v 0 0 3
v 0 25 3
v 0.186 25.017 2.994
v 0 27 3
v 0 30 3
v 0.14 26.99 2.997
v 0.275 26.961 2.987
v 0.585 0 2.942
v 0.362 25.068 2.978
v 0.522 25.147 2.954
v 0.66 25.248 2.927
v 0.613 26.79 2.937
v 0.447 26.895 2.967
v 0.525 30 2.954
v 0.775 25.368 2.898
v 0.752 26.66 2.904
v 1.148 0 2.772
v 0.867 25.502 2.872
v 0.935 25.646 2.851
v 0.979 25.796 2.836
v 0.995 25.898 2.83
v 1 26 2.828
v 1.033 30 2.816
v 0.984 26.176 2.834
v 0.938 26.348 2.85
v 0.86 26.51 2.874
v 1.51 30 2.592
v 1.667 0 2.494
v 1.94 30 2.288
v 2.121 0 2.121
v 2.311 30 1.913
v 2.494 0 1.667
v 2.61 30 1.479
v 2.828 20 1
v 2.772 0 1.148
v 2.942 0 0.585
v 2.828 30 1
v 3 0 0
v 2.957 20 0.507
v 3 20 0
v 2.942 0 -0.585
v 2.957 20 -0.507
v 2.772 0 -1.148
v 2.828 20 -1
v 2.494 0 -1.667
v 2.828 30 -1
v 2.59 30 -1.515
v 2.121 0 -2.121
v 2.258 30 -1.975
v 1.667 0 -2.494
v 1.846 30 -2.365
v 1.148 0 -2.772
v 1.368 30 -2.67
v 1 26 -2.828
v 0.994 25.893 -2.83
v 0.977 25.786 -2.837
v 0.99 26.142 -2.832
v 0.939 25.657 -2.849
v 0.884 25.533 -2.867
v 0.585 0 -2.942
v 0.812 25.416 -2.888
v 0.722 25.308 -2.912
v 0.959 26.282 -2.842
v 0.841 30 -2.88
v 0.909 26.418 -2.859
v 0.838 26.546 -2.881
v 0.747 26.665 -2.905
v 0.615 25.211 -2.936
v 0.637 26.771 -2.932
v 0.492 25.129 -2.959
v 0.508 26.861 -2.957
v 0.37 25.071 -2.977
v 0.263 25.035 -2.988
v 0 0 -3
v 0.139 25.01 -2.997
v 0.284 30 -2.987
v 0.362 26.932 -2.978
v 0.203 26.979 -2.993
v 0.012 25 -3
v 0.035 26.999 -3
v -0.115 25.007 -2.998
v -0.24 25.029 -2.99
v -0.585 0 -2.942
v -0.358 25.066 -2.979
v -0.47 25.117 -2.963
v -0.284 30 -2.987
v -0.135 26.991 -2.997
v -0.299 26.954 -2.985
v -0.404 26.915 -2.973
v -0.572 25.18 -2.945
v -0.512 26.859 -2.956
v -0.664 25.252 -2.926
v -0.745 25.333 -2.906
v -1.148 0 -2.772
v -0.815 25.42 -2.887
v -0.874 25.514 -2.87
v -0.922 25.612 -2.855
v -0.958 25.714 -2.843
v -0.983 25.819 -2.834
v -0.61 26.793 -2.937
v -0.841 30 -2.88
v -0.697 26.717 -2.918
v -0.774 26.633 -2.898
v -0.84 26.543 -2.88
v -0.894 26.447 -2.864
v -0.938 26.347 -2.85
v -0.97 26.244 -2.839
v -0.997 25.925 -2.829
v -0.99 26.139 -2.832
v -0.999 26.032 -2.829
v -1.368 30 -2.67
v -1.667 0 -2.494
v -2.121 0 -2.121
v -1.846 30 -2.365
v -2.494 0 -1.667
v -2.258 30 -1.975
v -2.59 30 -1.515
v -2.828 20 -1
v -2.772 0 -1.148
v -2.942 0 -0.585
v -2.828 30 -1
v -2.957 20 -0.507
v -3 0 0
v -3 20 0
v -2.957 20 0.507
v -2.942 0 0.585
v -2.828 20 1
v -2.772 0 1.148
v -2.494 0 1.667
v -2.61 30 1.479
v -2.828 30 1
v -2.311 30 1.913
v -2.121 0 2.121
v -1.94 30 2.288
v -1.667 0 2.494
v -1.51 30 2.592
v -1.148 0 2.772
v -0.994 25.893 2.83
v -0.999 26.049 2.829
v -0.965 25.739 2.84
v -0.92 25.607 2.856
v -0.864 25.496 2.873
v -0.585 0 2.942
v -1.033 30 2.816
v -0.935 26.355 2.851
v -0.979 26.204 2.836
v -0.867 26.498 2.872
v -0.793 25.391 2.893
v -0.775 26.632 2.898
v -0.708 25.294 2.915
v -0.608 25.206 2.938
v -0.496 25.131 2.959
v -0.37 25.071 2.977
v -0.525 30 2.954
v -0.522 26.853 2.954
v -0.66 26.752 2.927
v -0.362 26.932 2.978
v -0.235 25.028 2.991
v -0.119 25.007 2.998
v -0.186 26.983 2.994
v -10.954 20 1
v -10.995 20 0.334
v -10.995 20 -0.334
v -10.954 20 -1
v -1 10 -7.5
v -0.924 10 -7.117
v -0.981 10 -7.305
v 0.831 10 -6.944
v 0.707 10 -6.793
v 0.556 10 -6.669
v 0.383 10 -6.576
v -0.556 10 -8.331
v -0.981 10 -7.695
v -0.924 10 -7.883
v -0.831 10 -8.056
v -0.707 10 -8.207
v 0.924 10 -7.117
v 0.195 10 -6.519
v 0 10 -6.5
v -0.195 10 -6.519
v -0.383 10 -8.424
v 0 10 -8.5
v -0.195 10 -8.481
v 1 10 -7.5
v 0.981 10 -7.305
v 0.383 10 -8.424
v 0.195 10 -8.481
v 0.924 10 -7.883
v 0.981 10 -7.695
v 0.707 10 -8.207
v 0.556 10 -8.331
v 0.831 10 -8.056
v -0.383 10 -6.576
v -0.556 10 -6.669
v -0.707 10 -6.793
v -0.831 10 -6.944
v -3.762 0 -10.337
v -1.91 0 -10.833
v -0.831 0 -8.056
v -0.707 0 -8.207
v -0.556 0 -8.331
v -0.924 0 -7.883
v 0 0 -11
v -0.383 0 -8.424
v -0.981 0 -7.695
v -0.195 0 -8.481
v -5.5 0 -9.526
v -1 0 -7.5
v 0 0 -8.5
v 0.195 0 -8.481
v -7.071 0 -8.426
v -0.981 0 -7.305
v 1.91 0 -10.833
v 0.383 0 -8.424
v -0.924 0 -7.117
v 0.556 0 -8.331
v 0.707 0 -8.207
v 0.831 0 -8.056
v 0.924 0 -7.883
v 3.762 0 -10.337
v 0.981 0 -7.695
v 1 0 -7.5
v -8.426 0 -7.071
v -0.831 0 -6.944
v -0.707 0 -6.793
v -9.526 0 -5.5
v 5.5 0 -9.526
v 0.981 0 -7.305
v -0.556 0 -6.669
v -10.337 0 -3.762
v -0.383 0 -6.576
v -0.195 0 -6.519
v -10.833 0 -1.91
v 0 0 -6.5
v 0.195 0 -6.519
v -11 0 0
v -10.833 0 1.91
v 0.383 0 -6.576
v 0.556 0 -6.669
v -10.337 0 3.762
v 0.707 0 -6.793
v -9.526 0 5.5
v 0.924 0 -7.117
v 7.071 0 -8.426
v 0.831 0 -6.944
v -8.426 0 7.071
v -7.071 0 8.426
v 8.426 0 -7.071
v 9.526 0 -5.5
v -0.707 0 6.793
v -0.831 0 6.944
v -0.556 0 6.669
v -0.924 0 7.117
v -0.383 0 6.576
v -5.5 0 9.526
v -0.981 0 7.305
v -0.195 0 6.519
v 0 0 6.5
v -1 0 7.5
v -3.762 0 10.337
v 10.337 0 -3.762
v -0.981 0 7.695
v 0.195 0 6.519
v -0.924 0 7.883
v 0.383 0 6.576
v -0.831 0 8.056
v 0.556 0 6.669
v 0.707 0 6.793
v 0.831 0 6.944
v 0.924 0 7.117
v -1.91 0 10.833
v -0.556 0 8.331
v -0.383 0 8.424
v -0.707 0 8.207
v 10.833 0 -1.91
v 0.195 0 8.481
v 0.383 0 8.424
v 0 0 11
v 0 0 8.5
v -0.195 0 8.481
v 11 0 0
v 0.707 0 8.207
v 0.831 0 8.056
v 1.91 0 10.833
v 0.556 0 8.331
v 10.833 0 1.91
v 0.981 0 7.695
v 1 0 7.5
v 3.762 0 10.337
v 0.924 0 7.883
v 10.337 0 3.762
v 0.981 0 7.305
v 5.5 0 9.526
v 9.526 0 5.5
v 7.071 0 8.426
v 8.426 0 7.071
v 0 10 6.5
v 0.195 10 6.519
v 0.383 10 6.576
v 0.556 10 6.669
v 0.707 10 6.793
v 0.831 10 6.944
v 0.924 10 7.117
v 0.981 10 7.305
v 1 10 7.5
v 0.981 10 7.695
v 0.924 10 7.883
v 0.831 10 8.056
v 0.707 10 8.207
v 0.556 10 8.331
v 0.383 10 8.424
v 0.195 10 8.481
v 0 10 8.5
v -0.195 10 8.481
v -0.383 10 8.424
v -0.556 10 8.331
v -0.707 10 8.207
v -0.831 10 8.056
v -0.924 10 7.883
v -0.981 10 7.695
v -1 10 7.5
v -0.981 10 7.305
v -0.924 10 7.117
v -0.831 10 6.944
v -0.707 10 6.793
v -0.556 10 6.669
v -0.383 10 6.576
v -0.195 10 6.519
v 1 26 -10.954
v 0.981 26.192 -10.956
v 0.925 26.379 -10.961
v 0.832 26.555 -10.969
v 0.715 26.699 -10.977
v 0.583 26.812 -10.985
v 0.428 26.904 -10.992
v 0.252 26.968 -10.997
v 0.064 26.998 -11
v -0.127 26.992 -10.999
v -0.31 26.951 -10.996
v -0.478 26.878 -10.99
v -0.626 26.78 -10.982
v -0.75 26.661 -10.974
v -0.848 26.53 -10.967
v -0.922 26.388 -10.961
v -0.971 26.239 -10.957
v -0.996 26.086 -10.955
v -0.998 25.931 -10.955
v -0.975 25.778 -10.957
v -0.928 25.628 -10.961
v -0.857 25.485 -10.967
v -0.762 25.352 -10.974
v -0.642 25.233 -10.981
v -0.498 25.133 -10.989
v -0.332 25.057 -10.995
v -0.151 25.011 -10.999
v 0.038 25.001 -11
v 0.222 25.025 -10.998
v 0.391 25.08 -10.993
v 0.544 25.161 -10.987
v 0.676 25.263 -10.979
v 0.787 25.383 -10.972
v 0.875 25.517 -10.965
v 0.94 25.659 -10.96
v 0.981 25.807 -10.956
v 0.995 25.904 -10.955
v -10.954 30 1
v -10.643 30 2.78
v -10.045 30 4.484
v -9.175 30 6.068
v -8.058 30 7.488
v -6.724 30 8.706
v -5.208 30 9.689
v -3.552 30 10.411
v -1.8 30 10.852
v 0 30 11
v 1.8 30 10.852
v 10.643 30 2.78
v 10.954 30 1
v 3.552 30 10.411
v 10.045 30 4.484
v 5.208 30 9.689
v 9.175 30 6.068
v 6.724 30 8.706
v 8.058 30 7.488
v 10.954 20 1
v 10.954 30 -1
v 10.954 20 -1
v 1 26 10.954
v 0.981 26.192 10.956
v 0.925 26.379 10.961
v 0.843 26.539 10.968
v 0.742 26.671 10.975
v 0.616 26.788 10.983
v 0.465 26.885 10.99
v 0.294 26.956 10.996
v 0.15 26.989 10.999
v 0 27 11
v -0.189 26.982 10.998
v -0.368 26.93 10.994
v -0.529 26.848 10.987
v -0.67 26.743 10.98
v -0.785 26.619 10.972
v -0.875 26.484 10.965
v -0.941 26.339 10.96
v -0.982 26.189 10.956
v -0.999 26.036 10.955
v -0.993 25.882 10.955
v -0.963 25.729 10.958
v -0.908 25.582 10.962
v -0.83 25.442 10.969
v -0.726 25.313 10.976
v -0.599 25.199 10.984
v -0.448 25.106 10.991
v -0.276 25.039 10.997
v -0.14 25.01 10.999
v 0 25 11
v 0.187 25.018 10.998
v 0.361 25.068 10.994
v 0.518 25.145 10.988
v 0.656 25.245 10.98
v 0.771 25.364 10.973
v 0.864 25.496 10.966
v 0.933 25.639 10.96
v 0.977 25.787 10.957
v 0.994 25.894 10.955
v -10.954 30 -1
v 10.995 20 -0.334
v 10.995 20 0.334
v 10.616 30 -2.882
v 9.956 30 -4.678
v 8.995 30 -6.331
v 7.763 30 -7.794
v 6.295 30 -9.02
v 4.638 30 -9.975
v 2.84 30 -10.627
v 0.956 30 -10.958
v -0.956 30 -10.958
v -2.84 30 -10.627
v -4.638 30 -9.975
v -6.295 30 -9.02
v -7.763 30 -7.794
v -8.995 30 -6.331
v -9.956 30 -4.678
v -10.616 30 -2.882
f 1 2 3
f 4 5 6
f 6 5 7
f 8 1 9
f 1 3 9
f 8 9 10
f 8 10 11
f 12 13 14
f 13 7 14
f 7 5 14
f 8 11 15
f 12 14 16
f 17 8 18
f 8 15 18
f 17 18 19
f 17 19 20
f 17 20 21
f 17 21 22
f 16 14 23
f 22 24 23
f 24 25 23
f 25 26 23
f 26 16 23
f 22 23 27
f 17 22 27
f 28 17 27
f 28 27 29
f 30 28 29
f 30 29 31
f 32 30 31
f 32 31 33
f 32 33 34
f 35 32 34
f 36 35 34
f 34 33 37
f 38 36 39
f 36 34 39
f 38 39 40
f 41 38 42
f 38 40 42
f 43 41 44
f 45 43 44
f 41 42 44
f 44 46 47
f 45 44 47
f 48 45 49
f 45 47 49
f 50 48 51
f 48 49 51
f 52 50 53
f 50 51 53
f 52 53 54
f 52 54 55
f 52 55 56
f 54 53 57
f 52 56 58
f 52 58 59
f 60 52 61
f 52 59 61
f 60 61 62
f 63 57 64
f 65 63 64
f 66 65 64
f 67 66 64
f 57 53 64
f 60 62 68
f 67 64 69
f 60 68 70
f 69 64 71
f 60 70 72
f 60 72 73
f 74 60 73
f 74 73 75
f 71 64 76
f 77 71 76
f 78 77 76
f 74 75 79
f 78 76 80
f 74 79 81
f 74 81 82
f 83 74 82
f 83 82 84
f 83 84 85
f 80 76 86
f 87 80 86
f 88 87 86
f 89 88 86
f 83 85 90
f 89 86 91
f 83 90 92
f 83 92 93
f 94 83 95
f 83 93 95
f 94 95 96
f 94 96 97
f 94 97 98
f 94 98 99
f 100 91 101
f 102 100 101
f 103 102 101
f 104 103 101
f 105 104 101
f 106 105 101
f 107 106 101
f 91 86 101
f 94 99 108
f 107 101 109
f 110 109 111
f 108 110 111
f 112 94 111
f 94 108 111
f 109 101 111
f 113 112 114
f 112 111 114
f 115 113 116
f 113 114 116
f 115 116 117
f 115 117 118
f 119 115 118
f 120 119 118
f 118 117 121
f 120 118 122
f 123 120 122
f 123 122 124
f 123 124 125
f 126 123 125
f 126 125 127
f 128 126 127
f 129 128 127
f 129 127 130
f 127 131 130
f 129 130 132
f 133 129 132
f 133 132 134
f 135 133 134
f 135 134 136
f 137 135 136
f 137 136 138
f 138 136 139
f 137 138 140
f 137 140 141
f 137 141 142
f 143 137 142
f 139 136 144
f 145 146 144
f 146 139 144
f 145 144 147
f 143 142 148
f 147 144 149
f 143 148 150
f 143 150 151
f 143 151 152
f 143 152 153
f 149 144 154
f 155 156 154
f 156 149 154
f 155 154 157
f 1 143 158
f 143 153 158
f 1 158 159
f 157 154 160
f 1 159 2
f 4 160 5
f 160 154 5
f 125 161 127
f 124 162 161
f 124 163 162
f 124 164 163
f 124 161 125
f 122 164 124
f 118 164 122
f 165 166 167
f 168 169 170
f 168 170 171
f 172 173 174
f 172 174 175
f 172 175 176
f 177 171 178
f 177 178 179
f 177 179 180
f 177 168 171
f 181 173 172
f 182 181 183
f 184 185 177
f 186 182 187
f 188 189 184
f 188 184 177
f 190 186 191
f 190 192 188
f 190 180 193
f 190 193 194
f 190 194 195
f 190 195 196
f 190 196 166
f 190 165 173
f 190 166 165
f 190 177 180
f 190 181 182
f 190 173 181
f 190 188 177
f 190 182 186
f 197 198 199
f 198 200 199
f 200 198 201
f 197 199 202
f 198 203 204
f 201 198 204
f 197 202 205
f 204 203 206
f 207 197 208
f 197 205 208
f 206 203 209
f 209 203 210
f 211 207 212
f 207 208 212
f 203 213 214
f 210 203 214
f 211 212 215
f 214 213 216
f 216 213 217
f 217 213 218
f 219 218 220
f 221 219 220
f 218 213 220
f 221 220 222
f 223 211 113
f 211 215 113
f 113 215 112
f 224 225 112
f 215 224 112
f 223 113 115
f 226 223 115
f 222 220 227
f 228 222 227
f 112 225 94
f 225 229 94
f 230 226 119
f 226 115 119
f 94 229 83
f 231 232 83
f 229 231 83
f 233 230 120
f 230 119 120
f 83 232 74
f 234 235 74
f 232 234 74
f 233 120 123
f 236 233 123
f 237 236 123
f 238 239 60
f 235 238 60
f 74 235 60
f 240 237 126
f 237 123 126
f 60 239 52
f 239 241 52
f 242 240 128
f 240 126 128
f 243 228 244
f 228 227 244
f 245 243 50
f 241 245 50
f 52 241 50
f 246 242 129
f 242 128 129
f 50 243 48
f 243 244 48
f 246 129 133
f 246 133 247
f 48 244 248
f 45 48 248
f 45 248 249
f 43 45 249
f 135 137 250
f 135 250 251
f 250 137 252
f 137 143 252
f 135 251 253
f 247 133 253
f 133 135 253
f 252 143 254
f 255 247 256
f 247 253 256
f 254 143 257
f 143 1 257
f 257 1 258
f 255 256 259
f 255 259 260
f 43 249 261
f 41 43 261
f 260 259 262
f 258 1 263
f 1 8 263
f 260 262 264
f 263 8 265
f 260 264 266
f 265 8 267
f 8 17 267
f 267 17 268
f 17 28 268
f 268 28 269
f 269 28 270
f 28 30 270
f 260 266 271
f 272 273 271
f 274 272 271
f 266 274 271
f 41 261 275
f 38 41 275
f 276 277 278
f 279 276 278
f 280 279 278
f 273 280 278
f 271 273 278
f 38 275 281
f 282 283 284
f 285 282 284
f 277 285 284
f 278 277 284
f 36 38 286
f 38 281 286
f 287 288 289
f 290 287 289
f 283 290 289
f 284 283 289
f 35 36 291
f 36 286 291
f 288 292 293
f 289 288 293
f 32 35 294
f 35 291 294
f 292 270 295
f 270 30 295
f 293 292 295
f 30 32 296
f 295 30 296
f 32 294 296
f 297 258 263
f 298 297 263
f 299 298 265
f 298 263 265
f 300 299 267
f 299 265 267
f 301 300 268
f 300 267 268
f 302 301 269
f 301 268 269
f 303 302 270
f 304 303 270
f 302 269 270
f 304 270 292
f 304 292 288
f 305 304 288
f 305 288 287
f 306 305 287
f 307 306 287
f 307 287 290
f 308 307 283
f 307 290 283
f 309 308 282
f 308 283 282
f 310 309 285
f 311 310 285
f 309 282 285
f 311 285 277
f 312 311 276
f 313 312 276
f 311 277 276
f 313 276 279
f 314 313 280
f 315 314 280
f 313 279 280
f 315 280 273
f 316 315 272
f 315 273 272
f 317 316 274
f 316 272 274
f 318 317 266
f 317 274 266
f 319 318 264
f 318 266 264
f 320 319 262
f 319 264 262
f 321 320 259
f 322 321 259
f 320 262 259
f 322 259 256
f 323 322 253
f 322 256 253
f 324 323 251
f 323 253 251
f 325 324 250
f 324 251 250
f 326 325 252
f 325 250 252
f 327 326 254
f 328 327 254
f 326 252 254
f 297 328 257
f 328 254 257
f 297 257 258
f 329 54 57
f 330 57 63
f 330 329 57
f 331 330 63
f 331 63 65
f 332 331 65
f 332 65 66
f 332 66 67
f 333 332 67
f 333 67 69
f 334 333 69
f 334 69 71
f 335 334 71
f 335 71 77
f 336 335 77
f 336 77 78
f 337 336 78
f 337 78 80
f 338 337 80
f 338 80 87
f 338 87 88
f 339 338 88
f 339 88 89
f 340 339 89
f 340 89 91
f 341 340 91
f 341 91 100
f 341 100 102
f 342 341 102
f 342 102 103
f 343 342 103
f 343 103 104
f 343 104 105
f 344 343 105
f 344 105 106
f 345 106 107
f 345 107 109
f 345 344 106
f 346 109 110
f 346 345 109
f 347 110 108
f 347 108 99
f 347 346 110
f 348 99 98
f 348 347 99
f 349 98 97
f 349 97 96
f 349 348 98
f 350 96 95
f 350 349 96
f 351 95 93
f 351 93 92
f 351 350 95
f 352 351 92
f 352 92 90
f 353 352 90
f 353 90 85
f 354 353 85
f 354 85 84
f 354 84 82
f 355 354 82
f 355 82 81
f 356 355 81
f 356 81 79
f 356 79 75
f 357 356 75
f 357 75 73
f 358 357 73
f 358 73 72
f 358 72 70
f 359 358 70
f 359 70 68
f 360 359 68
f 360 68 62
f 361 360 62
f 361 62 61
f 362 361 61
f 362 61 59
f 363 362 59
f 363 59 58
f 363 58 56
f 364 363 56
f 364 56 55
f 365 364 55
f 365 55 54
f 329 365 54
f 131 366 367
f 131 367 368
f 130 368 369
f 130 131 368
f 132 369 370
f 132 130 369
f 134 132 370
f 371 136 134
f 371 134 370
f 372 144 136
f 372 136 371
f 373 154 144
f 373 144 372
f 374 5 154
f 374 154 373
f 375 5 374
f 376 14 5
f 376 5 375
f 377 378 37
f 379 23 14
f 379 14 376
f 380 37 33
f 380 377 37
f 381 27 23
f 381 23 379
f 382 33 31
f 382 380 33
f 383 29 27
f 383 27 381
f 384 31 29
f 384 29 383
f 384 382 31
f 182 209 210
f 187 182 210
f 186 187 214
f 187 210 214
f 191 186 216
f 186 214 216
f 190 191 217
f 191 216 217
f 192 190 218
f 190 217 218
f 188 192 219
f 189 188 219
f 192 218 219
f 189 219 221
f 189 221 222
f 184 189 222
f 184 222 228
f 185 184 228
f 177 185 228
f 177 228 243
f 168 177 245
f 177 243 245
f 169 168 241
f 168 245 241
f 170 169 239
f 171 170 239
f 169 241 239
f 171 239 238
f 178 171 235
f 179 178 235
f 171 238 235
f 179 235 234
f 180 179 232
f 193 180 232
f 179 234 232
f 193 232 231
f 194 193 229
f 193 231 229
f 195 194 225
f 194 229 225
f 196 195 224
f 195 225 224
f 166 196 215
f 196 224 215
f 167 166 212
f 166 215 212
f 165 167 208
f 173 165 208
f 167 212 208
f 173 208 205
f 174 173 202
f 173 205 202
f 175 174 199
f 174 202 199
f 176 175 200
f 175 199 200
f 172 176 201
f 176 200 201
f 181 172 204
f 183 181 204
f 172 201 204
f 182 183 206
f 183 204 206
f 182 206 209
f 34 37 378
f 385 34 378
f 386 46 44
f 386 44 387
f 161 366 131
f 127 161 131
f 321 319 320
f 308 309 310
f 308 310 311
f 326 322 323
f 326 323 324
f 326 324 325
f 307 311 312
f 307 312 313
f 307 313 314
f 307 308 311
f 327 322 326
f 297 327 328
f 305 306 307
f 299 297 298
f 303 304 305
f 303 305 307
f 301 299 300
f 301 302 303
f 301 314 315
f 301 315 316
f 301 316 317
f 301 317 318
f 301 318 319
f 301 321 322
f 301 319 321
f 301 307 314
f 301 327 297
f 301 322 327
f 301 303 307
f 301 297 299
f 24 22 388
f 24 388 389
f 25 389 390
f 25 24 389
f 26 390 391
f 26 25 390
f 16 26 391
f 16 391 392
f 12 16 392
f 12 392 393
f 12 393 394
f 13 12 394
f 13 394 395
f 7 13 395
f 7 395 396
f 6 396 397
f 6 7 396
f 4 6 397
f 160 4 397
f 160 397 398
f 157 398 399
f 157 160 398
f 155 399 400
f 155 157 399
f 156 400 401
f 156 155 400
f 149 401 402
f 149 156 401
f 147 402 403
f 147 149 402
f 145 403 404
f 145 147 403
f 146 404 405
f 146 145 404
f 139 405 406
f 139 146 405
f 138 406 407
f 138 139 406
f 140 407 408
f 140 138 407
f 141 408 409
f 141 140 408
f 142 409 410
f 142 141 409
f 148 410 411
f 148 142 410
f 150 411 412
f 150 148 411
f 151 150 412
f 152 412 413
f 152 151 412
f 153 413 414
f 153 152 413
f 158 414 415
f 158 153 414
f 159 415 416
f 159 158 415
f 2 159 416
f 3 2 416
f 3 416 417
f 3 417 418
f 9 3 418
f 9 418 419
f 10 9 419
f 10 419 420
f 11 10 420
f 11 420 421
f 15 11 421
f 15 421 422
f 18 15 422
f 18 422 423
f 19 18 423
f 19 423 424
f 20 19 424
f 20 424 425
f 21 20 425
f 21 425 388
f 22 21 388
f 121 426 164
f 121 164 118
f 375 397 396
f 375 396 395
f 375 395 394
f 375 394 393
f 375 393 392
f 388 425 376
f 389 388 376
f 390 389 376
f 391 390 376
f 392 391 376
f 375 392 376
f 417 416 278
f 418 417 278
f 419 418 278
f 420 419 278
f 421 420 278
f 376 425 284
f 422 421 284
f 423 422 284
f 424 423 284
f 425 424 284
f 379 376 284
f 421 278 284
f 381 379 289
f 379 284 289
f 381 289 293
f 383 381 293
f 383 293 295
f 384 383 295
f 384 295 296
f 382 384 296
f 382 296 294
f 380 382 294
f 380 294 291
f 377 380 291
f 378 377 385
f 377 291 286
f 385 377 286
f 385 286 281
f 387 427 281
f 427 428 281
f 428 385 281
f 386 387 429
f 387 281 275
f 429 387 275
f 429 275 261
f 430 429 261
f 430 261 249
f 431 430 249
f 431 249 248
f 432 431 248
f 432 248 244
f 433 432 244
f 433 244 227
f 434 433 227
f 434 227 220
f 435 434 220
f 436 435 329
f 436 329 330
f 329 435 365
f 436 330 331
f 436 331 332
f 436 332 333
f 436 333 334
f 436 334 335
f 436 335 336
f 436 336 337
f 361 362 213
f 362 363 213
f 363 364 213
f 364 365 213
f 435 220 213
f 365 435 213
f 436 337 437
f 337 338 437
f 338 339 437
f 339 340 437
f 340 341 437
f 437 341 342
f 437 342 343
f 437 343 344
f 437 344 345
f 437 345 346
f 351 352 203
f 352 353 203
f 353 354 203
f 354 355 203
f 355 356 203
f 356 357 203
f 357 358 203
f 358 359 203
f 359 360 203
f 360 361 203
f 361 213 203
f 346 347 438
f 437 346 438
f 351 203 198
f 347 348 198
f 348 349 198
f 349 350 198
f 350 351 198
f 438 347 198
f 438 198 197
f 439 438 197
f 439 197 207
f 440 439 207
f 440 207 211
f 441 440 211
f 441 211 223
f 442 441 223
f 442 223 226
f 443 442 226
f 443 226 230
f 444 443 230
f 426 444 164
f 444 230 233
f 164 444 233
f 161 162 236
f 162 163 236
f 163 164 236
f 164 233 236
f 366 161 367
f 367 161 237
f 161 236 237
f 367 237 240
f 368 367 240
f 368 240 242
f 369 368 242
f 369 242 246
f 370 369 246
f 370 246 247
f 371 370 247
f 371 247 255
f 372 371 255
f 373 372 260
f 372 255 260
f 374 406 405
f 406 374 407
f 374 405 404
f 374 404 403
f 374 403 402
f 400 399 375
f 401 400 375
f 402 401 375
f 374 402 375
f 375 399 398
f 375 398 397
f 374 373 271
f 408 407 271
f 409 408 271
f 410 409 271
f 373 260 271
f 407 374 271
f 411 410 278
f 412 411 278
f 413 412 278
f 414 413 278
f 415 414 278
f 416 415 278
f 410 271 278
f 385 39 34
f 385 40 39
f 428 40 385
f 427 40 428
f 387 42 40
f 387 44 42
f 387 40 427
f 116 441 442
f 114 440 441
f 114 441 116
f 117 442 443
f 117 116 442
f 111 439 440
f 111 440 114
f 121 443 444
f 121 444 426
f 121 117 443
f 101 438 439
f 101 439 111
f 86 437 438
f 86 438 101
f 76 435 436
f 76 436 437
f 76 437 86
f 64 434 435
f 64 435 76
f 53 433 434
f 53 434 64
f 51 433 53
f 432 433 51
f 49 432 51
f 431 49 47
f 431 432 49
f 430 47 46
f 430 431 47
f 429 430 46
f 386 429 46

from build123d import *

# Parameters (mm, degrees)
SKIZZE1_R                            = 11
AUFSATZ_LINEAR_AUSTRAGEN1_DEPTH      = 30
SKIZZE2_R                            = 3
SCHNITT_LINEAR_AUSTRAGEN1_DEPTH      = 34.793490497
SKIZZE3_W                            = 30
SKIZZE3_H                            = 2
SCHNITT_LINEAR_AUSTRAGEN2_DEPTH      = 10
SCHNITT_LINEAR_AUSTRAGEN3_DEPTH      = 35.132096332
SCHNITT_LINEAR_AUSTRAGEN3_DEPTH_BACK = 35.132096332
SKIZZE4_R                            = 1
SKIZZE5_R                            = 1
SCHNITT_LINEAR_AUSTRAGEN4_DEPTH      = 10


with BuildPart() as part:
    # Skizze1 → Aufsatz-Linear austragen1 (new body)
    with BuildSketch(Plane(origin=(0, 0, 0), x_dir=(1, 0, 0), z_dir=(0, 1, 0))):
        with Locations(Location((0, 0, 0), (0, 0, 270))):
            Circle(SKIZZE1_R)
    extrude(amount=AUFSATZ_LINEAR_AUSTRAGEN1_DEPTH)

    # Skizze2 → Schnitt-Linear austragen1 (cut, through all)
    with BuildSketch(Plane(origin=(0, 30, 0), x_dir=(1, 0, 0), z_dir=(0, 1, 0))):
        with Locations(Location((0, 0, 0), (0, 0, 270))):
            Circle(SKIZZE2_R)
    extrude(amount=-SCHNITT_LINEAR_AUSTRAGEN1_DEPTH, mode=Mode.SUBTRACT)

    # Skizze3 → Schnitt-Linear austragen2 (cut)
    with BuildSketch(Plane(origin=(0, 30, 0), x_dir=(1, 0, 0), z_dir=(0, 1, 0))):
        Rectangle(SKIZZE3_W, SKIZZE3_H)
    extrude(amount=-SCHNITT_LINEAR_AUSTRAGEN2_DEPTH, mode=Mode.SUBTRACT)

    # Skizze4 → Schnitt-Linear austragen3 (cut, two sides: drawn at the far end of the back side and taken through both)
    with BuildSketch(Plane.XY.offset(-1).offset(-SCHNITT_LINEAR_AUSTRAGEN3_DEPTH_BACK)):
        with Locations((0, 26)):
            Circle(SKIZZE4_R)
    extrude(amount=SCHNITT_LINEAR_AUSTRAGEN3_DEPTH + SCHNITT_LINEAR_AUSTRAGEN3_DEPTH_BACK, mode=Mode.SUBTRACT)

    # Skizze5 → Schnitt-Linear austragen4 (cut)
    with BuildSketch(Plane.XZ):
        with Locations(Location((0, 7.5, 0), (0, 0, 270))):
            Circle(SKIZZE5_R)
        with Locations(Location((0, -7.5, 0), (0, 0, 270))):
            Circle(SKIZZE5_R)
    extrude(amount=-SCHNITT_LINEAR_AUSTRAGEN4_DEPTH, mode=Mode.SUBTRACT)


solid = part.part
